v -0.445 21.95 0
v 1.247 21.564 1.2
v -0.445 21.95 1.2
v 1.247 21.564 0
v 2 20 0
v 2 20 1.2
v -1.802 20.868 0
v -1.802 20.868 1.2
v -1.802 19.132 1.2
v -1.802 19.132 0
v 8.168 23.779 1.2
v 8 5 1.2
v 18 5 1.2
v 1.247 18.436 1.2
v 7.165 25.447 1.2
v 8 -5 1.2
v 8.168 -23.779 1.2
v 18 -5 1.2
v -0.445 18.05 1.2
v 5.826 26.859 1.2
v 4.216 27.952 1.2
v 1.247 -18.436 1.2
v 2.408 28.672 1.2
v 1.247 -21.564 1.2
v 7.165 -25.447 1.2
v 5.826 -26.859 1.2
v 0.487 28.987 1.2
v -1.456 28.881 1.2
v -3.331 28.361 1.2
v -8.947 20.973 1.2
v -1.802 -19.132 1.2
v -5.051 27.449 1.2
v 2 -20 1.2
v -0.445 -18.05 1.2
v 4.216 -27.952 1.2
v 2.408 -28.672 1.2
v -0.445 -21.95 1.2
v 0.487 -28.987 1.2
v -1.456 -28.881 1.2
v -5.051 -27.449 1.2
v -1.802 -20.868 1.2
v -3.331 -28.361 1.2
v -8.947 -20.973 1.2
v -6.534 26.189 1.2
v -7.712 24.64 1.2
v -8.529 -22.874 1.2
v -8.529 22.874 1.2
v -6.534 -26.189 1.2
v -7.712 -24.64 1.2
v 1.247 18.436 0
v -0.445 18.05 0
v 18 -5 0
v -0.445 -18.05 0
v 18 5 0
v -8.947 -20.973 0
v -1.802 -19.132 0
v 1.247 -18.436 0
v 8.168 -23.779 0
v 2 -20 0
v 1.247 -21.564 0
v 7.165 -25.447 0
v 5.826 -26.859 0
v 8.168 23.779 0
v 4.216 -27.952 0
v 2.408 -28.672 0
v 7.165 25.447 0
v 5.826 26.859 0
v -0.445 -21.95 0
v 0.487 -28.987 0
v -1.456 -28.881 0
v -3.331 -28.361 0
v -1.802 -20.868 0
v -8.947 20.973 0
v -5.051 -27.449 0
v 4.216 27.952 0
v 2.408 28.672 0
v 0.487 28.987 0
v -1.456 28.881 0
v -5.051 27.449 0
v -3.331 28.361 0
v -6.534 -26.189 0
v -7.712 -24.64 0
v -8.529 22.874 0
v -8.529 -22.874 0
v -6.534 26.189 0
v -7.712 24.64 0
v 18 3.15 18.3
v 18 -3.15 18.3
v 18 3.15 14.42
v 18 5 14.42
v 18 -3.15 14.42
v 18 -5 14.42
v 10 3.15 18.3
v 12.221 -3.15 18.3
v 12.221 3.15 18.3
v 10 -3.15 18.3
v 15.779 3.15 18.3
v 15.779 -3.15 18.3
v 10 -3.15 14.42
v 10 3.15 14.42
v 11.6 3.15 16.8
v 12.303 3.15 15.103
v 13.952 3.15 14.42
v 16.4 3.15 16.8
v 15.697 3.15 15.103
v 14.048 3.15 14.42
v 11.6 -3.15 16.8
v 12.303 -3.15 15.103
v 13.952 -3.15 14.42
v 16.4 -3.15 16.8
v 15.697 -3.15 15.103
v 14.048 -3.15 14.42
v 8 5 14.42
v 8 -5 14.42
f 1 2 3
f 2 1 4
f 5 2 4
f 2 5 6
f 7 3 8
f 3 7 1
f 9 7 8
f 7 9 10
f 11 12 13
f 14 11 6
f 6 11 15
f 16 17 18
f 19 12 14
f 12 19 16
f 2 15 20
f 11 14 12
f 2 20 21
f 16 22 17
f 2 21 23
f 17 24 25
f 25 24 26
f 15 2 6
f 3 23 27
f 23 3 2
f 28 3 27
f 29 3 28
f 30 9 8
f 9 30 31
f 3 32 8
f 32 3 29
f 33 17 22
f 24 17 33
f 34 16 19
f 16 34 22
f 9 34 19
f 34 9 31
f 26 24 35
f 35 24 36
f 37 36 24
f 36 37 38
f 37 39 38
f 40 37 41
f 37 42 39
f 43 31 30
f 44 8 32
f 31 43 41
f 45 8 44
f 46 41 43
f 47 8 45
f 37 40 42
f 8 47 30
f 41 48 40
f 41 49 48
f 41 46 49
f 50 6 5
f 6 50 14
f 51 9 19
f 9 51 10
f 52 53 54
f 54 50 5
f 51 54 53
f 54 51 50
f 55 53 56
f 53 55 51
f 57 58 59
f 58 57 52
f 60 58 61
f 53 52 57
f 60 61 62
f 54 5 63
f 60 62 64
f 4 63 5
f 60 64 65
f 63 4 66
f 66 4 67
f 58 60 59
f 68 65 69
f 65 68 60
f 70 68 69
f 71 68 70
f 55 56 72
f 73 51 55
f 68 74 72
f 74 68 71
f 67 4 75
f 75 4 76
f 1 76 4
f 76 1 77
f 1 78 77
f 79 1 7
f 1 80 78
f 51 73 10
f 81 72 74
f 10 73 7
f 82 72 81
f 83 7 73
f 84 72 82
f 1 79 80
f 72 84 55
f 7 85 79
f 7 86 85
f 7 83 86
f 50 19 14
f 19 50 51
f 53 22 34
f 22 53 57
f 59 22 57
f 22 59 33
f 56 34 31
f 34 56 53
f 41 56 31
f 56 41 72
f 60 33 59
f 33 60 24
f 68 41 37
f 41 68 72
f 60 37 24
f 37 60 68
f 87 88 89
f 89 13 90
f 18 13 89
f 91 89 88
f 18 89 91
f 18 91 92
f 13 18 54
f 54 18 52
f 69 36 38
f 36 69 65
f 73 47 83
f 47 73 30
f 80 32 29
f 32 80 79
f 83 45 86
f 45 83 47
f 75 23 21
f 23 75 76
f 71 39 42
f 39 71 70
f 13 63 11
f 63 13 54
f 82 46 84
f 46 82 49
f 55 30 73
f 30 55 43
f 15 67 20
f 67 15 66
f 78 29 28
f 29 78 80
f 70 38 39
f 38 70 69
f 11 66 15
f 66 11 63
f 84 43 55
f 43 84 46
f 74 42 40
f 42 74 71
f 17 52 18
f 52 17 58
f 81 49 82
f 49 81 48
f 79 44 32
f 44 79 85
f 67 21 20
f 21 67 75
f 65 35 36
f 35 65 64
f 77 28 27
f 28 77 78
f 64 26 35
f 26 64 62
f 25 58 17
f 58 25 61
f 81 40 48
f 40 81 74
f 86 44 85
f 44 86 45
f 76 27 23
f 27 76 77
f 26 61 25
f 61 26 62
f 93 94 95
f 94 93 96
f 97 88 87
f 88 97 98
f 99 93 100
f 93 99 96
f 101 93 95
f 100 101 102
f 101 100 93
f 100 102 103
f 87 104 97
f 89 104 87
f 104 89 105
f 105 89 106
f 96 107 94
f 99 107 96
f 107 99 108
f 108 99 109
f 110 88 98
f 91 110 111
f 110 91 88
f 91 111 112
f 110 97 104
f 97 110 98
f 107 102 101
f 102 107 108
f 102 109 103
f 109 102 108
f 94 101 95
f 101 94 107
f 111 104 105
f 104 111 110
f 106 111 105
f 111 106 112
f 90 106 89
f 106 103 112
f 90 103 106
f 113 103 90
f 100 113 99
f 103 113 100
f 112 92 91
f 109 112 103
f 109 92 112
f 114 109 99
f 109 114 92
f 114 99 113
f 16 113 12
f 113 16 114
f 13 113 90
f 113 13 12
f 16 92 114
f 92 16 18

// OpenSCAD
base_thick = 1.2;

difference() {
  hull() {
    translate([0, +40/2, 0])
      cylinder(r1=9, r2=9, h=base_thick, $n=60);
    translate([0, -40/2, 0])
      cylinder(r1=9, r2=9, h=base_thick, $n=60);
    translate([-10+18, -10/2, 0])
      cube([10,10,base_thick]);
  }
  union() {
    translate([0, +40/2, 0])
      cylinder(r1=2, r2=2, h=base_thick);
    translate([0, -40/2, 0])
      cylinder(r1=2, r2=2, h=base_thick);   
  }
}
translate([-10+18, -10/2, 0])
  cube([10,10,4.5+8.3+1.62]);

difference() {
  translate([-8+18, -6.3/2, 4.5+8.3])
    cube([8,6.3,5.5]);
  translate([-8+18+4, -6.3/2+8, 4.5+4.+8.3])
    rotate([90, 0, 0])
      cylinder(r1=4.8/2, r2=4.8/2, h=10, $n=60); 
}
